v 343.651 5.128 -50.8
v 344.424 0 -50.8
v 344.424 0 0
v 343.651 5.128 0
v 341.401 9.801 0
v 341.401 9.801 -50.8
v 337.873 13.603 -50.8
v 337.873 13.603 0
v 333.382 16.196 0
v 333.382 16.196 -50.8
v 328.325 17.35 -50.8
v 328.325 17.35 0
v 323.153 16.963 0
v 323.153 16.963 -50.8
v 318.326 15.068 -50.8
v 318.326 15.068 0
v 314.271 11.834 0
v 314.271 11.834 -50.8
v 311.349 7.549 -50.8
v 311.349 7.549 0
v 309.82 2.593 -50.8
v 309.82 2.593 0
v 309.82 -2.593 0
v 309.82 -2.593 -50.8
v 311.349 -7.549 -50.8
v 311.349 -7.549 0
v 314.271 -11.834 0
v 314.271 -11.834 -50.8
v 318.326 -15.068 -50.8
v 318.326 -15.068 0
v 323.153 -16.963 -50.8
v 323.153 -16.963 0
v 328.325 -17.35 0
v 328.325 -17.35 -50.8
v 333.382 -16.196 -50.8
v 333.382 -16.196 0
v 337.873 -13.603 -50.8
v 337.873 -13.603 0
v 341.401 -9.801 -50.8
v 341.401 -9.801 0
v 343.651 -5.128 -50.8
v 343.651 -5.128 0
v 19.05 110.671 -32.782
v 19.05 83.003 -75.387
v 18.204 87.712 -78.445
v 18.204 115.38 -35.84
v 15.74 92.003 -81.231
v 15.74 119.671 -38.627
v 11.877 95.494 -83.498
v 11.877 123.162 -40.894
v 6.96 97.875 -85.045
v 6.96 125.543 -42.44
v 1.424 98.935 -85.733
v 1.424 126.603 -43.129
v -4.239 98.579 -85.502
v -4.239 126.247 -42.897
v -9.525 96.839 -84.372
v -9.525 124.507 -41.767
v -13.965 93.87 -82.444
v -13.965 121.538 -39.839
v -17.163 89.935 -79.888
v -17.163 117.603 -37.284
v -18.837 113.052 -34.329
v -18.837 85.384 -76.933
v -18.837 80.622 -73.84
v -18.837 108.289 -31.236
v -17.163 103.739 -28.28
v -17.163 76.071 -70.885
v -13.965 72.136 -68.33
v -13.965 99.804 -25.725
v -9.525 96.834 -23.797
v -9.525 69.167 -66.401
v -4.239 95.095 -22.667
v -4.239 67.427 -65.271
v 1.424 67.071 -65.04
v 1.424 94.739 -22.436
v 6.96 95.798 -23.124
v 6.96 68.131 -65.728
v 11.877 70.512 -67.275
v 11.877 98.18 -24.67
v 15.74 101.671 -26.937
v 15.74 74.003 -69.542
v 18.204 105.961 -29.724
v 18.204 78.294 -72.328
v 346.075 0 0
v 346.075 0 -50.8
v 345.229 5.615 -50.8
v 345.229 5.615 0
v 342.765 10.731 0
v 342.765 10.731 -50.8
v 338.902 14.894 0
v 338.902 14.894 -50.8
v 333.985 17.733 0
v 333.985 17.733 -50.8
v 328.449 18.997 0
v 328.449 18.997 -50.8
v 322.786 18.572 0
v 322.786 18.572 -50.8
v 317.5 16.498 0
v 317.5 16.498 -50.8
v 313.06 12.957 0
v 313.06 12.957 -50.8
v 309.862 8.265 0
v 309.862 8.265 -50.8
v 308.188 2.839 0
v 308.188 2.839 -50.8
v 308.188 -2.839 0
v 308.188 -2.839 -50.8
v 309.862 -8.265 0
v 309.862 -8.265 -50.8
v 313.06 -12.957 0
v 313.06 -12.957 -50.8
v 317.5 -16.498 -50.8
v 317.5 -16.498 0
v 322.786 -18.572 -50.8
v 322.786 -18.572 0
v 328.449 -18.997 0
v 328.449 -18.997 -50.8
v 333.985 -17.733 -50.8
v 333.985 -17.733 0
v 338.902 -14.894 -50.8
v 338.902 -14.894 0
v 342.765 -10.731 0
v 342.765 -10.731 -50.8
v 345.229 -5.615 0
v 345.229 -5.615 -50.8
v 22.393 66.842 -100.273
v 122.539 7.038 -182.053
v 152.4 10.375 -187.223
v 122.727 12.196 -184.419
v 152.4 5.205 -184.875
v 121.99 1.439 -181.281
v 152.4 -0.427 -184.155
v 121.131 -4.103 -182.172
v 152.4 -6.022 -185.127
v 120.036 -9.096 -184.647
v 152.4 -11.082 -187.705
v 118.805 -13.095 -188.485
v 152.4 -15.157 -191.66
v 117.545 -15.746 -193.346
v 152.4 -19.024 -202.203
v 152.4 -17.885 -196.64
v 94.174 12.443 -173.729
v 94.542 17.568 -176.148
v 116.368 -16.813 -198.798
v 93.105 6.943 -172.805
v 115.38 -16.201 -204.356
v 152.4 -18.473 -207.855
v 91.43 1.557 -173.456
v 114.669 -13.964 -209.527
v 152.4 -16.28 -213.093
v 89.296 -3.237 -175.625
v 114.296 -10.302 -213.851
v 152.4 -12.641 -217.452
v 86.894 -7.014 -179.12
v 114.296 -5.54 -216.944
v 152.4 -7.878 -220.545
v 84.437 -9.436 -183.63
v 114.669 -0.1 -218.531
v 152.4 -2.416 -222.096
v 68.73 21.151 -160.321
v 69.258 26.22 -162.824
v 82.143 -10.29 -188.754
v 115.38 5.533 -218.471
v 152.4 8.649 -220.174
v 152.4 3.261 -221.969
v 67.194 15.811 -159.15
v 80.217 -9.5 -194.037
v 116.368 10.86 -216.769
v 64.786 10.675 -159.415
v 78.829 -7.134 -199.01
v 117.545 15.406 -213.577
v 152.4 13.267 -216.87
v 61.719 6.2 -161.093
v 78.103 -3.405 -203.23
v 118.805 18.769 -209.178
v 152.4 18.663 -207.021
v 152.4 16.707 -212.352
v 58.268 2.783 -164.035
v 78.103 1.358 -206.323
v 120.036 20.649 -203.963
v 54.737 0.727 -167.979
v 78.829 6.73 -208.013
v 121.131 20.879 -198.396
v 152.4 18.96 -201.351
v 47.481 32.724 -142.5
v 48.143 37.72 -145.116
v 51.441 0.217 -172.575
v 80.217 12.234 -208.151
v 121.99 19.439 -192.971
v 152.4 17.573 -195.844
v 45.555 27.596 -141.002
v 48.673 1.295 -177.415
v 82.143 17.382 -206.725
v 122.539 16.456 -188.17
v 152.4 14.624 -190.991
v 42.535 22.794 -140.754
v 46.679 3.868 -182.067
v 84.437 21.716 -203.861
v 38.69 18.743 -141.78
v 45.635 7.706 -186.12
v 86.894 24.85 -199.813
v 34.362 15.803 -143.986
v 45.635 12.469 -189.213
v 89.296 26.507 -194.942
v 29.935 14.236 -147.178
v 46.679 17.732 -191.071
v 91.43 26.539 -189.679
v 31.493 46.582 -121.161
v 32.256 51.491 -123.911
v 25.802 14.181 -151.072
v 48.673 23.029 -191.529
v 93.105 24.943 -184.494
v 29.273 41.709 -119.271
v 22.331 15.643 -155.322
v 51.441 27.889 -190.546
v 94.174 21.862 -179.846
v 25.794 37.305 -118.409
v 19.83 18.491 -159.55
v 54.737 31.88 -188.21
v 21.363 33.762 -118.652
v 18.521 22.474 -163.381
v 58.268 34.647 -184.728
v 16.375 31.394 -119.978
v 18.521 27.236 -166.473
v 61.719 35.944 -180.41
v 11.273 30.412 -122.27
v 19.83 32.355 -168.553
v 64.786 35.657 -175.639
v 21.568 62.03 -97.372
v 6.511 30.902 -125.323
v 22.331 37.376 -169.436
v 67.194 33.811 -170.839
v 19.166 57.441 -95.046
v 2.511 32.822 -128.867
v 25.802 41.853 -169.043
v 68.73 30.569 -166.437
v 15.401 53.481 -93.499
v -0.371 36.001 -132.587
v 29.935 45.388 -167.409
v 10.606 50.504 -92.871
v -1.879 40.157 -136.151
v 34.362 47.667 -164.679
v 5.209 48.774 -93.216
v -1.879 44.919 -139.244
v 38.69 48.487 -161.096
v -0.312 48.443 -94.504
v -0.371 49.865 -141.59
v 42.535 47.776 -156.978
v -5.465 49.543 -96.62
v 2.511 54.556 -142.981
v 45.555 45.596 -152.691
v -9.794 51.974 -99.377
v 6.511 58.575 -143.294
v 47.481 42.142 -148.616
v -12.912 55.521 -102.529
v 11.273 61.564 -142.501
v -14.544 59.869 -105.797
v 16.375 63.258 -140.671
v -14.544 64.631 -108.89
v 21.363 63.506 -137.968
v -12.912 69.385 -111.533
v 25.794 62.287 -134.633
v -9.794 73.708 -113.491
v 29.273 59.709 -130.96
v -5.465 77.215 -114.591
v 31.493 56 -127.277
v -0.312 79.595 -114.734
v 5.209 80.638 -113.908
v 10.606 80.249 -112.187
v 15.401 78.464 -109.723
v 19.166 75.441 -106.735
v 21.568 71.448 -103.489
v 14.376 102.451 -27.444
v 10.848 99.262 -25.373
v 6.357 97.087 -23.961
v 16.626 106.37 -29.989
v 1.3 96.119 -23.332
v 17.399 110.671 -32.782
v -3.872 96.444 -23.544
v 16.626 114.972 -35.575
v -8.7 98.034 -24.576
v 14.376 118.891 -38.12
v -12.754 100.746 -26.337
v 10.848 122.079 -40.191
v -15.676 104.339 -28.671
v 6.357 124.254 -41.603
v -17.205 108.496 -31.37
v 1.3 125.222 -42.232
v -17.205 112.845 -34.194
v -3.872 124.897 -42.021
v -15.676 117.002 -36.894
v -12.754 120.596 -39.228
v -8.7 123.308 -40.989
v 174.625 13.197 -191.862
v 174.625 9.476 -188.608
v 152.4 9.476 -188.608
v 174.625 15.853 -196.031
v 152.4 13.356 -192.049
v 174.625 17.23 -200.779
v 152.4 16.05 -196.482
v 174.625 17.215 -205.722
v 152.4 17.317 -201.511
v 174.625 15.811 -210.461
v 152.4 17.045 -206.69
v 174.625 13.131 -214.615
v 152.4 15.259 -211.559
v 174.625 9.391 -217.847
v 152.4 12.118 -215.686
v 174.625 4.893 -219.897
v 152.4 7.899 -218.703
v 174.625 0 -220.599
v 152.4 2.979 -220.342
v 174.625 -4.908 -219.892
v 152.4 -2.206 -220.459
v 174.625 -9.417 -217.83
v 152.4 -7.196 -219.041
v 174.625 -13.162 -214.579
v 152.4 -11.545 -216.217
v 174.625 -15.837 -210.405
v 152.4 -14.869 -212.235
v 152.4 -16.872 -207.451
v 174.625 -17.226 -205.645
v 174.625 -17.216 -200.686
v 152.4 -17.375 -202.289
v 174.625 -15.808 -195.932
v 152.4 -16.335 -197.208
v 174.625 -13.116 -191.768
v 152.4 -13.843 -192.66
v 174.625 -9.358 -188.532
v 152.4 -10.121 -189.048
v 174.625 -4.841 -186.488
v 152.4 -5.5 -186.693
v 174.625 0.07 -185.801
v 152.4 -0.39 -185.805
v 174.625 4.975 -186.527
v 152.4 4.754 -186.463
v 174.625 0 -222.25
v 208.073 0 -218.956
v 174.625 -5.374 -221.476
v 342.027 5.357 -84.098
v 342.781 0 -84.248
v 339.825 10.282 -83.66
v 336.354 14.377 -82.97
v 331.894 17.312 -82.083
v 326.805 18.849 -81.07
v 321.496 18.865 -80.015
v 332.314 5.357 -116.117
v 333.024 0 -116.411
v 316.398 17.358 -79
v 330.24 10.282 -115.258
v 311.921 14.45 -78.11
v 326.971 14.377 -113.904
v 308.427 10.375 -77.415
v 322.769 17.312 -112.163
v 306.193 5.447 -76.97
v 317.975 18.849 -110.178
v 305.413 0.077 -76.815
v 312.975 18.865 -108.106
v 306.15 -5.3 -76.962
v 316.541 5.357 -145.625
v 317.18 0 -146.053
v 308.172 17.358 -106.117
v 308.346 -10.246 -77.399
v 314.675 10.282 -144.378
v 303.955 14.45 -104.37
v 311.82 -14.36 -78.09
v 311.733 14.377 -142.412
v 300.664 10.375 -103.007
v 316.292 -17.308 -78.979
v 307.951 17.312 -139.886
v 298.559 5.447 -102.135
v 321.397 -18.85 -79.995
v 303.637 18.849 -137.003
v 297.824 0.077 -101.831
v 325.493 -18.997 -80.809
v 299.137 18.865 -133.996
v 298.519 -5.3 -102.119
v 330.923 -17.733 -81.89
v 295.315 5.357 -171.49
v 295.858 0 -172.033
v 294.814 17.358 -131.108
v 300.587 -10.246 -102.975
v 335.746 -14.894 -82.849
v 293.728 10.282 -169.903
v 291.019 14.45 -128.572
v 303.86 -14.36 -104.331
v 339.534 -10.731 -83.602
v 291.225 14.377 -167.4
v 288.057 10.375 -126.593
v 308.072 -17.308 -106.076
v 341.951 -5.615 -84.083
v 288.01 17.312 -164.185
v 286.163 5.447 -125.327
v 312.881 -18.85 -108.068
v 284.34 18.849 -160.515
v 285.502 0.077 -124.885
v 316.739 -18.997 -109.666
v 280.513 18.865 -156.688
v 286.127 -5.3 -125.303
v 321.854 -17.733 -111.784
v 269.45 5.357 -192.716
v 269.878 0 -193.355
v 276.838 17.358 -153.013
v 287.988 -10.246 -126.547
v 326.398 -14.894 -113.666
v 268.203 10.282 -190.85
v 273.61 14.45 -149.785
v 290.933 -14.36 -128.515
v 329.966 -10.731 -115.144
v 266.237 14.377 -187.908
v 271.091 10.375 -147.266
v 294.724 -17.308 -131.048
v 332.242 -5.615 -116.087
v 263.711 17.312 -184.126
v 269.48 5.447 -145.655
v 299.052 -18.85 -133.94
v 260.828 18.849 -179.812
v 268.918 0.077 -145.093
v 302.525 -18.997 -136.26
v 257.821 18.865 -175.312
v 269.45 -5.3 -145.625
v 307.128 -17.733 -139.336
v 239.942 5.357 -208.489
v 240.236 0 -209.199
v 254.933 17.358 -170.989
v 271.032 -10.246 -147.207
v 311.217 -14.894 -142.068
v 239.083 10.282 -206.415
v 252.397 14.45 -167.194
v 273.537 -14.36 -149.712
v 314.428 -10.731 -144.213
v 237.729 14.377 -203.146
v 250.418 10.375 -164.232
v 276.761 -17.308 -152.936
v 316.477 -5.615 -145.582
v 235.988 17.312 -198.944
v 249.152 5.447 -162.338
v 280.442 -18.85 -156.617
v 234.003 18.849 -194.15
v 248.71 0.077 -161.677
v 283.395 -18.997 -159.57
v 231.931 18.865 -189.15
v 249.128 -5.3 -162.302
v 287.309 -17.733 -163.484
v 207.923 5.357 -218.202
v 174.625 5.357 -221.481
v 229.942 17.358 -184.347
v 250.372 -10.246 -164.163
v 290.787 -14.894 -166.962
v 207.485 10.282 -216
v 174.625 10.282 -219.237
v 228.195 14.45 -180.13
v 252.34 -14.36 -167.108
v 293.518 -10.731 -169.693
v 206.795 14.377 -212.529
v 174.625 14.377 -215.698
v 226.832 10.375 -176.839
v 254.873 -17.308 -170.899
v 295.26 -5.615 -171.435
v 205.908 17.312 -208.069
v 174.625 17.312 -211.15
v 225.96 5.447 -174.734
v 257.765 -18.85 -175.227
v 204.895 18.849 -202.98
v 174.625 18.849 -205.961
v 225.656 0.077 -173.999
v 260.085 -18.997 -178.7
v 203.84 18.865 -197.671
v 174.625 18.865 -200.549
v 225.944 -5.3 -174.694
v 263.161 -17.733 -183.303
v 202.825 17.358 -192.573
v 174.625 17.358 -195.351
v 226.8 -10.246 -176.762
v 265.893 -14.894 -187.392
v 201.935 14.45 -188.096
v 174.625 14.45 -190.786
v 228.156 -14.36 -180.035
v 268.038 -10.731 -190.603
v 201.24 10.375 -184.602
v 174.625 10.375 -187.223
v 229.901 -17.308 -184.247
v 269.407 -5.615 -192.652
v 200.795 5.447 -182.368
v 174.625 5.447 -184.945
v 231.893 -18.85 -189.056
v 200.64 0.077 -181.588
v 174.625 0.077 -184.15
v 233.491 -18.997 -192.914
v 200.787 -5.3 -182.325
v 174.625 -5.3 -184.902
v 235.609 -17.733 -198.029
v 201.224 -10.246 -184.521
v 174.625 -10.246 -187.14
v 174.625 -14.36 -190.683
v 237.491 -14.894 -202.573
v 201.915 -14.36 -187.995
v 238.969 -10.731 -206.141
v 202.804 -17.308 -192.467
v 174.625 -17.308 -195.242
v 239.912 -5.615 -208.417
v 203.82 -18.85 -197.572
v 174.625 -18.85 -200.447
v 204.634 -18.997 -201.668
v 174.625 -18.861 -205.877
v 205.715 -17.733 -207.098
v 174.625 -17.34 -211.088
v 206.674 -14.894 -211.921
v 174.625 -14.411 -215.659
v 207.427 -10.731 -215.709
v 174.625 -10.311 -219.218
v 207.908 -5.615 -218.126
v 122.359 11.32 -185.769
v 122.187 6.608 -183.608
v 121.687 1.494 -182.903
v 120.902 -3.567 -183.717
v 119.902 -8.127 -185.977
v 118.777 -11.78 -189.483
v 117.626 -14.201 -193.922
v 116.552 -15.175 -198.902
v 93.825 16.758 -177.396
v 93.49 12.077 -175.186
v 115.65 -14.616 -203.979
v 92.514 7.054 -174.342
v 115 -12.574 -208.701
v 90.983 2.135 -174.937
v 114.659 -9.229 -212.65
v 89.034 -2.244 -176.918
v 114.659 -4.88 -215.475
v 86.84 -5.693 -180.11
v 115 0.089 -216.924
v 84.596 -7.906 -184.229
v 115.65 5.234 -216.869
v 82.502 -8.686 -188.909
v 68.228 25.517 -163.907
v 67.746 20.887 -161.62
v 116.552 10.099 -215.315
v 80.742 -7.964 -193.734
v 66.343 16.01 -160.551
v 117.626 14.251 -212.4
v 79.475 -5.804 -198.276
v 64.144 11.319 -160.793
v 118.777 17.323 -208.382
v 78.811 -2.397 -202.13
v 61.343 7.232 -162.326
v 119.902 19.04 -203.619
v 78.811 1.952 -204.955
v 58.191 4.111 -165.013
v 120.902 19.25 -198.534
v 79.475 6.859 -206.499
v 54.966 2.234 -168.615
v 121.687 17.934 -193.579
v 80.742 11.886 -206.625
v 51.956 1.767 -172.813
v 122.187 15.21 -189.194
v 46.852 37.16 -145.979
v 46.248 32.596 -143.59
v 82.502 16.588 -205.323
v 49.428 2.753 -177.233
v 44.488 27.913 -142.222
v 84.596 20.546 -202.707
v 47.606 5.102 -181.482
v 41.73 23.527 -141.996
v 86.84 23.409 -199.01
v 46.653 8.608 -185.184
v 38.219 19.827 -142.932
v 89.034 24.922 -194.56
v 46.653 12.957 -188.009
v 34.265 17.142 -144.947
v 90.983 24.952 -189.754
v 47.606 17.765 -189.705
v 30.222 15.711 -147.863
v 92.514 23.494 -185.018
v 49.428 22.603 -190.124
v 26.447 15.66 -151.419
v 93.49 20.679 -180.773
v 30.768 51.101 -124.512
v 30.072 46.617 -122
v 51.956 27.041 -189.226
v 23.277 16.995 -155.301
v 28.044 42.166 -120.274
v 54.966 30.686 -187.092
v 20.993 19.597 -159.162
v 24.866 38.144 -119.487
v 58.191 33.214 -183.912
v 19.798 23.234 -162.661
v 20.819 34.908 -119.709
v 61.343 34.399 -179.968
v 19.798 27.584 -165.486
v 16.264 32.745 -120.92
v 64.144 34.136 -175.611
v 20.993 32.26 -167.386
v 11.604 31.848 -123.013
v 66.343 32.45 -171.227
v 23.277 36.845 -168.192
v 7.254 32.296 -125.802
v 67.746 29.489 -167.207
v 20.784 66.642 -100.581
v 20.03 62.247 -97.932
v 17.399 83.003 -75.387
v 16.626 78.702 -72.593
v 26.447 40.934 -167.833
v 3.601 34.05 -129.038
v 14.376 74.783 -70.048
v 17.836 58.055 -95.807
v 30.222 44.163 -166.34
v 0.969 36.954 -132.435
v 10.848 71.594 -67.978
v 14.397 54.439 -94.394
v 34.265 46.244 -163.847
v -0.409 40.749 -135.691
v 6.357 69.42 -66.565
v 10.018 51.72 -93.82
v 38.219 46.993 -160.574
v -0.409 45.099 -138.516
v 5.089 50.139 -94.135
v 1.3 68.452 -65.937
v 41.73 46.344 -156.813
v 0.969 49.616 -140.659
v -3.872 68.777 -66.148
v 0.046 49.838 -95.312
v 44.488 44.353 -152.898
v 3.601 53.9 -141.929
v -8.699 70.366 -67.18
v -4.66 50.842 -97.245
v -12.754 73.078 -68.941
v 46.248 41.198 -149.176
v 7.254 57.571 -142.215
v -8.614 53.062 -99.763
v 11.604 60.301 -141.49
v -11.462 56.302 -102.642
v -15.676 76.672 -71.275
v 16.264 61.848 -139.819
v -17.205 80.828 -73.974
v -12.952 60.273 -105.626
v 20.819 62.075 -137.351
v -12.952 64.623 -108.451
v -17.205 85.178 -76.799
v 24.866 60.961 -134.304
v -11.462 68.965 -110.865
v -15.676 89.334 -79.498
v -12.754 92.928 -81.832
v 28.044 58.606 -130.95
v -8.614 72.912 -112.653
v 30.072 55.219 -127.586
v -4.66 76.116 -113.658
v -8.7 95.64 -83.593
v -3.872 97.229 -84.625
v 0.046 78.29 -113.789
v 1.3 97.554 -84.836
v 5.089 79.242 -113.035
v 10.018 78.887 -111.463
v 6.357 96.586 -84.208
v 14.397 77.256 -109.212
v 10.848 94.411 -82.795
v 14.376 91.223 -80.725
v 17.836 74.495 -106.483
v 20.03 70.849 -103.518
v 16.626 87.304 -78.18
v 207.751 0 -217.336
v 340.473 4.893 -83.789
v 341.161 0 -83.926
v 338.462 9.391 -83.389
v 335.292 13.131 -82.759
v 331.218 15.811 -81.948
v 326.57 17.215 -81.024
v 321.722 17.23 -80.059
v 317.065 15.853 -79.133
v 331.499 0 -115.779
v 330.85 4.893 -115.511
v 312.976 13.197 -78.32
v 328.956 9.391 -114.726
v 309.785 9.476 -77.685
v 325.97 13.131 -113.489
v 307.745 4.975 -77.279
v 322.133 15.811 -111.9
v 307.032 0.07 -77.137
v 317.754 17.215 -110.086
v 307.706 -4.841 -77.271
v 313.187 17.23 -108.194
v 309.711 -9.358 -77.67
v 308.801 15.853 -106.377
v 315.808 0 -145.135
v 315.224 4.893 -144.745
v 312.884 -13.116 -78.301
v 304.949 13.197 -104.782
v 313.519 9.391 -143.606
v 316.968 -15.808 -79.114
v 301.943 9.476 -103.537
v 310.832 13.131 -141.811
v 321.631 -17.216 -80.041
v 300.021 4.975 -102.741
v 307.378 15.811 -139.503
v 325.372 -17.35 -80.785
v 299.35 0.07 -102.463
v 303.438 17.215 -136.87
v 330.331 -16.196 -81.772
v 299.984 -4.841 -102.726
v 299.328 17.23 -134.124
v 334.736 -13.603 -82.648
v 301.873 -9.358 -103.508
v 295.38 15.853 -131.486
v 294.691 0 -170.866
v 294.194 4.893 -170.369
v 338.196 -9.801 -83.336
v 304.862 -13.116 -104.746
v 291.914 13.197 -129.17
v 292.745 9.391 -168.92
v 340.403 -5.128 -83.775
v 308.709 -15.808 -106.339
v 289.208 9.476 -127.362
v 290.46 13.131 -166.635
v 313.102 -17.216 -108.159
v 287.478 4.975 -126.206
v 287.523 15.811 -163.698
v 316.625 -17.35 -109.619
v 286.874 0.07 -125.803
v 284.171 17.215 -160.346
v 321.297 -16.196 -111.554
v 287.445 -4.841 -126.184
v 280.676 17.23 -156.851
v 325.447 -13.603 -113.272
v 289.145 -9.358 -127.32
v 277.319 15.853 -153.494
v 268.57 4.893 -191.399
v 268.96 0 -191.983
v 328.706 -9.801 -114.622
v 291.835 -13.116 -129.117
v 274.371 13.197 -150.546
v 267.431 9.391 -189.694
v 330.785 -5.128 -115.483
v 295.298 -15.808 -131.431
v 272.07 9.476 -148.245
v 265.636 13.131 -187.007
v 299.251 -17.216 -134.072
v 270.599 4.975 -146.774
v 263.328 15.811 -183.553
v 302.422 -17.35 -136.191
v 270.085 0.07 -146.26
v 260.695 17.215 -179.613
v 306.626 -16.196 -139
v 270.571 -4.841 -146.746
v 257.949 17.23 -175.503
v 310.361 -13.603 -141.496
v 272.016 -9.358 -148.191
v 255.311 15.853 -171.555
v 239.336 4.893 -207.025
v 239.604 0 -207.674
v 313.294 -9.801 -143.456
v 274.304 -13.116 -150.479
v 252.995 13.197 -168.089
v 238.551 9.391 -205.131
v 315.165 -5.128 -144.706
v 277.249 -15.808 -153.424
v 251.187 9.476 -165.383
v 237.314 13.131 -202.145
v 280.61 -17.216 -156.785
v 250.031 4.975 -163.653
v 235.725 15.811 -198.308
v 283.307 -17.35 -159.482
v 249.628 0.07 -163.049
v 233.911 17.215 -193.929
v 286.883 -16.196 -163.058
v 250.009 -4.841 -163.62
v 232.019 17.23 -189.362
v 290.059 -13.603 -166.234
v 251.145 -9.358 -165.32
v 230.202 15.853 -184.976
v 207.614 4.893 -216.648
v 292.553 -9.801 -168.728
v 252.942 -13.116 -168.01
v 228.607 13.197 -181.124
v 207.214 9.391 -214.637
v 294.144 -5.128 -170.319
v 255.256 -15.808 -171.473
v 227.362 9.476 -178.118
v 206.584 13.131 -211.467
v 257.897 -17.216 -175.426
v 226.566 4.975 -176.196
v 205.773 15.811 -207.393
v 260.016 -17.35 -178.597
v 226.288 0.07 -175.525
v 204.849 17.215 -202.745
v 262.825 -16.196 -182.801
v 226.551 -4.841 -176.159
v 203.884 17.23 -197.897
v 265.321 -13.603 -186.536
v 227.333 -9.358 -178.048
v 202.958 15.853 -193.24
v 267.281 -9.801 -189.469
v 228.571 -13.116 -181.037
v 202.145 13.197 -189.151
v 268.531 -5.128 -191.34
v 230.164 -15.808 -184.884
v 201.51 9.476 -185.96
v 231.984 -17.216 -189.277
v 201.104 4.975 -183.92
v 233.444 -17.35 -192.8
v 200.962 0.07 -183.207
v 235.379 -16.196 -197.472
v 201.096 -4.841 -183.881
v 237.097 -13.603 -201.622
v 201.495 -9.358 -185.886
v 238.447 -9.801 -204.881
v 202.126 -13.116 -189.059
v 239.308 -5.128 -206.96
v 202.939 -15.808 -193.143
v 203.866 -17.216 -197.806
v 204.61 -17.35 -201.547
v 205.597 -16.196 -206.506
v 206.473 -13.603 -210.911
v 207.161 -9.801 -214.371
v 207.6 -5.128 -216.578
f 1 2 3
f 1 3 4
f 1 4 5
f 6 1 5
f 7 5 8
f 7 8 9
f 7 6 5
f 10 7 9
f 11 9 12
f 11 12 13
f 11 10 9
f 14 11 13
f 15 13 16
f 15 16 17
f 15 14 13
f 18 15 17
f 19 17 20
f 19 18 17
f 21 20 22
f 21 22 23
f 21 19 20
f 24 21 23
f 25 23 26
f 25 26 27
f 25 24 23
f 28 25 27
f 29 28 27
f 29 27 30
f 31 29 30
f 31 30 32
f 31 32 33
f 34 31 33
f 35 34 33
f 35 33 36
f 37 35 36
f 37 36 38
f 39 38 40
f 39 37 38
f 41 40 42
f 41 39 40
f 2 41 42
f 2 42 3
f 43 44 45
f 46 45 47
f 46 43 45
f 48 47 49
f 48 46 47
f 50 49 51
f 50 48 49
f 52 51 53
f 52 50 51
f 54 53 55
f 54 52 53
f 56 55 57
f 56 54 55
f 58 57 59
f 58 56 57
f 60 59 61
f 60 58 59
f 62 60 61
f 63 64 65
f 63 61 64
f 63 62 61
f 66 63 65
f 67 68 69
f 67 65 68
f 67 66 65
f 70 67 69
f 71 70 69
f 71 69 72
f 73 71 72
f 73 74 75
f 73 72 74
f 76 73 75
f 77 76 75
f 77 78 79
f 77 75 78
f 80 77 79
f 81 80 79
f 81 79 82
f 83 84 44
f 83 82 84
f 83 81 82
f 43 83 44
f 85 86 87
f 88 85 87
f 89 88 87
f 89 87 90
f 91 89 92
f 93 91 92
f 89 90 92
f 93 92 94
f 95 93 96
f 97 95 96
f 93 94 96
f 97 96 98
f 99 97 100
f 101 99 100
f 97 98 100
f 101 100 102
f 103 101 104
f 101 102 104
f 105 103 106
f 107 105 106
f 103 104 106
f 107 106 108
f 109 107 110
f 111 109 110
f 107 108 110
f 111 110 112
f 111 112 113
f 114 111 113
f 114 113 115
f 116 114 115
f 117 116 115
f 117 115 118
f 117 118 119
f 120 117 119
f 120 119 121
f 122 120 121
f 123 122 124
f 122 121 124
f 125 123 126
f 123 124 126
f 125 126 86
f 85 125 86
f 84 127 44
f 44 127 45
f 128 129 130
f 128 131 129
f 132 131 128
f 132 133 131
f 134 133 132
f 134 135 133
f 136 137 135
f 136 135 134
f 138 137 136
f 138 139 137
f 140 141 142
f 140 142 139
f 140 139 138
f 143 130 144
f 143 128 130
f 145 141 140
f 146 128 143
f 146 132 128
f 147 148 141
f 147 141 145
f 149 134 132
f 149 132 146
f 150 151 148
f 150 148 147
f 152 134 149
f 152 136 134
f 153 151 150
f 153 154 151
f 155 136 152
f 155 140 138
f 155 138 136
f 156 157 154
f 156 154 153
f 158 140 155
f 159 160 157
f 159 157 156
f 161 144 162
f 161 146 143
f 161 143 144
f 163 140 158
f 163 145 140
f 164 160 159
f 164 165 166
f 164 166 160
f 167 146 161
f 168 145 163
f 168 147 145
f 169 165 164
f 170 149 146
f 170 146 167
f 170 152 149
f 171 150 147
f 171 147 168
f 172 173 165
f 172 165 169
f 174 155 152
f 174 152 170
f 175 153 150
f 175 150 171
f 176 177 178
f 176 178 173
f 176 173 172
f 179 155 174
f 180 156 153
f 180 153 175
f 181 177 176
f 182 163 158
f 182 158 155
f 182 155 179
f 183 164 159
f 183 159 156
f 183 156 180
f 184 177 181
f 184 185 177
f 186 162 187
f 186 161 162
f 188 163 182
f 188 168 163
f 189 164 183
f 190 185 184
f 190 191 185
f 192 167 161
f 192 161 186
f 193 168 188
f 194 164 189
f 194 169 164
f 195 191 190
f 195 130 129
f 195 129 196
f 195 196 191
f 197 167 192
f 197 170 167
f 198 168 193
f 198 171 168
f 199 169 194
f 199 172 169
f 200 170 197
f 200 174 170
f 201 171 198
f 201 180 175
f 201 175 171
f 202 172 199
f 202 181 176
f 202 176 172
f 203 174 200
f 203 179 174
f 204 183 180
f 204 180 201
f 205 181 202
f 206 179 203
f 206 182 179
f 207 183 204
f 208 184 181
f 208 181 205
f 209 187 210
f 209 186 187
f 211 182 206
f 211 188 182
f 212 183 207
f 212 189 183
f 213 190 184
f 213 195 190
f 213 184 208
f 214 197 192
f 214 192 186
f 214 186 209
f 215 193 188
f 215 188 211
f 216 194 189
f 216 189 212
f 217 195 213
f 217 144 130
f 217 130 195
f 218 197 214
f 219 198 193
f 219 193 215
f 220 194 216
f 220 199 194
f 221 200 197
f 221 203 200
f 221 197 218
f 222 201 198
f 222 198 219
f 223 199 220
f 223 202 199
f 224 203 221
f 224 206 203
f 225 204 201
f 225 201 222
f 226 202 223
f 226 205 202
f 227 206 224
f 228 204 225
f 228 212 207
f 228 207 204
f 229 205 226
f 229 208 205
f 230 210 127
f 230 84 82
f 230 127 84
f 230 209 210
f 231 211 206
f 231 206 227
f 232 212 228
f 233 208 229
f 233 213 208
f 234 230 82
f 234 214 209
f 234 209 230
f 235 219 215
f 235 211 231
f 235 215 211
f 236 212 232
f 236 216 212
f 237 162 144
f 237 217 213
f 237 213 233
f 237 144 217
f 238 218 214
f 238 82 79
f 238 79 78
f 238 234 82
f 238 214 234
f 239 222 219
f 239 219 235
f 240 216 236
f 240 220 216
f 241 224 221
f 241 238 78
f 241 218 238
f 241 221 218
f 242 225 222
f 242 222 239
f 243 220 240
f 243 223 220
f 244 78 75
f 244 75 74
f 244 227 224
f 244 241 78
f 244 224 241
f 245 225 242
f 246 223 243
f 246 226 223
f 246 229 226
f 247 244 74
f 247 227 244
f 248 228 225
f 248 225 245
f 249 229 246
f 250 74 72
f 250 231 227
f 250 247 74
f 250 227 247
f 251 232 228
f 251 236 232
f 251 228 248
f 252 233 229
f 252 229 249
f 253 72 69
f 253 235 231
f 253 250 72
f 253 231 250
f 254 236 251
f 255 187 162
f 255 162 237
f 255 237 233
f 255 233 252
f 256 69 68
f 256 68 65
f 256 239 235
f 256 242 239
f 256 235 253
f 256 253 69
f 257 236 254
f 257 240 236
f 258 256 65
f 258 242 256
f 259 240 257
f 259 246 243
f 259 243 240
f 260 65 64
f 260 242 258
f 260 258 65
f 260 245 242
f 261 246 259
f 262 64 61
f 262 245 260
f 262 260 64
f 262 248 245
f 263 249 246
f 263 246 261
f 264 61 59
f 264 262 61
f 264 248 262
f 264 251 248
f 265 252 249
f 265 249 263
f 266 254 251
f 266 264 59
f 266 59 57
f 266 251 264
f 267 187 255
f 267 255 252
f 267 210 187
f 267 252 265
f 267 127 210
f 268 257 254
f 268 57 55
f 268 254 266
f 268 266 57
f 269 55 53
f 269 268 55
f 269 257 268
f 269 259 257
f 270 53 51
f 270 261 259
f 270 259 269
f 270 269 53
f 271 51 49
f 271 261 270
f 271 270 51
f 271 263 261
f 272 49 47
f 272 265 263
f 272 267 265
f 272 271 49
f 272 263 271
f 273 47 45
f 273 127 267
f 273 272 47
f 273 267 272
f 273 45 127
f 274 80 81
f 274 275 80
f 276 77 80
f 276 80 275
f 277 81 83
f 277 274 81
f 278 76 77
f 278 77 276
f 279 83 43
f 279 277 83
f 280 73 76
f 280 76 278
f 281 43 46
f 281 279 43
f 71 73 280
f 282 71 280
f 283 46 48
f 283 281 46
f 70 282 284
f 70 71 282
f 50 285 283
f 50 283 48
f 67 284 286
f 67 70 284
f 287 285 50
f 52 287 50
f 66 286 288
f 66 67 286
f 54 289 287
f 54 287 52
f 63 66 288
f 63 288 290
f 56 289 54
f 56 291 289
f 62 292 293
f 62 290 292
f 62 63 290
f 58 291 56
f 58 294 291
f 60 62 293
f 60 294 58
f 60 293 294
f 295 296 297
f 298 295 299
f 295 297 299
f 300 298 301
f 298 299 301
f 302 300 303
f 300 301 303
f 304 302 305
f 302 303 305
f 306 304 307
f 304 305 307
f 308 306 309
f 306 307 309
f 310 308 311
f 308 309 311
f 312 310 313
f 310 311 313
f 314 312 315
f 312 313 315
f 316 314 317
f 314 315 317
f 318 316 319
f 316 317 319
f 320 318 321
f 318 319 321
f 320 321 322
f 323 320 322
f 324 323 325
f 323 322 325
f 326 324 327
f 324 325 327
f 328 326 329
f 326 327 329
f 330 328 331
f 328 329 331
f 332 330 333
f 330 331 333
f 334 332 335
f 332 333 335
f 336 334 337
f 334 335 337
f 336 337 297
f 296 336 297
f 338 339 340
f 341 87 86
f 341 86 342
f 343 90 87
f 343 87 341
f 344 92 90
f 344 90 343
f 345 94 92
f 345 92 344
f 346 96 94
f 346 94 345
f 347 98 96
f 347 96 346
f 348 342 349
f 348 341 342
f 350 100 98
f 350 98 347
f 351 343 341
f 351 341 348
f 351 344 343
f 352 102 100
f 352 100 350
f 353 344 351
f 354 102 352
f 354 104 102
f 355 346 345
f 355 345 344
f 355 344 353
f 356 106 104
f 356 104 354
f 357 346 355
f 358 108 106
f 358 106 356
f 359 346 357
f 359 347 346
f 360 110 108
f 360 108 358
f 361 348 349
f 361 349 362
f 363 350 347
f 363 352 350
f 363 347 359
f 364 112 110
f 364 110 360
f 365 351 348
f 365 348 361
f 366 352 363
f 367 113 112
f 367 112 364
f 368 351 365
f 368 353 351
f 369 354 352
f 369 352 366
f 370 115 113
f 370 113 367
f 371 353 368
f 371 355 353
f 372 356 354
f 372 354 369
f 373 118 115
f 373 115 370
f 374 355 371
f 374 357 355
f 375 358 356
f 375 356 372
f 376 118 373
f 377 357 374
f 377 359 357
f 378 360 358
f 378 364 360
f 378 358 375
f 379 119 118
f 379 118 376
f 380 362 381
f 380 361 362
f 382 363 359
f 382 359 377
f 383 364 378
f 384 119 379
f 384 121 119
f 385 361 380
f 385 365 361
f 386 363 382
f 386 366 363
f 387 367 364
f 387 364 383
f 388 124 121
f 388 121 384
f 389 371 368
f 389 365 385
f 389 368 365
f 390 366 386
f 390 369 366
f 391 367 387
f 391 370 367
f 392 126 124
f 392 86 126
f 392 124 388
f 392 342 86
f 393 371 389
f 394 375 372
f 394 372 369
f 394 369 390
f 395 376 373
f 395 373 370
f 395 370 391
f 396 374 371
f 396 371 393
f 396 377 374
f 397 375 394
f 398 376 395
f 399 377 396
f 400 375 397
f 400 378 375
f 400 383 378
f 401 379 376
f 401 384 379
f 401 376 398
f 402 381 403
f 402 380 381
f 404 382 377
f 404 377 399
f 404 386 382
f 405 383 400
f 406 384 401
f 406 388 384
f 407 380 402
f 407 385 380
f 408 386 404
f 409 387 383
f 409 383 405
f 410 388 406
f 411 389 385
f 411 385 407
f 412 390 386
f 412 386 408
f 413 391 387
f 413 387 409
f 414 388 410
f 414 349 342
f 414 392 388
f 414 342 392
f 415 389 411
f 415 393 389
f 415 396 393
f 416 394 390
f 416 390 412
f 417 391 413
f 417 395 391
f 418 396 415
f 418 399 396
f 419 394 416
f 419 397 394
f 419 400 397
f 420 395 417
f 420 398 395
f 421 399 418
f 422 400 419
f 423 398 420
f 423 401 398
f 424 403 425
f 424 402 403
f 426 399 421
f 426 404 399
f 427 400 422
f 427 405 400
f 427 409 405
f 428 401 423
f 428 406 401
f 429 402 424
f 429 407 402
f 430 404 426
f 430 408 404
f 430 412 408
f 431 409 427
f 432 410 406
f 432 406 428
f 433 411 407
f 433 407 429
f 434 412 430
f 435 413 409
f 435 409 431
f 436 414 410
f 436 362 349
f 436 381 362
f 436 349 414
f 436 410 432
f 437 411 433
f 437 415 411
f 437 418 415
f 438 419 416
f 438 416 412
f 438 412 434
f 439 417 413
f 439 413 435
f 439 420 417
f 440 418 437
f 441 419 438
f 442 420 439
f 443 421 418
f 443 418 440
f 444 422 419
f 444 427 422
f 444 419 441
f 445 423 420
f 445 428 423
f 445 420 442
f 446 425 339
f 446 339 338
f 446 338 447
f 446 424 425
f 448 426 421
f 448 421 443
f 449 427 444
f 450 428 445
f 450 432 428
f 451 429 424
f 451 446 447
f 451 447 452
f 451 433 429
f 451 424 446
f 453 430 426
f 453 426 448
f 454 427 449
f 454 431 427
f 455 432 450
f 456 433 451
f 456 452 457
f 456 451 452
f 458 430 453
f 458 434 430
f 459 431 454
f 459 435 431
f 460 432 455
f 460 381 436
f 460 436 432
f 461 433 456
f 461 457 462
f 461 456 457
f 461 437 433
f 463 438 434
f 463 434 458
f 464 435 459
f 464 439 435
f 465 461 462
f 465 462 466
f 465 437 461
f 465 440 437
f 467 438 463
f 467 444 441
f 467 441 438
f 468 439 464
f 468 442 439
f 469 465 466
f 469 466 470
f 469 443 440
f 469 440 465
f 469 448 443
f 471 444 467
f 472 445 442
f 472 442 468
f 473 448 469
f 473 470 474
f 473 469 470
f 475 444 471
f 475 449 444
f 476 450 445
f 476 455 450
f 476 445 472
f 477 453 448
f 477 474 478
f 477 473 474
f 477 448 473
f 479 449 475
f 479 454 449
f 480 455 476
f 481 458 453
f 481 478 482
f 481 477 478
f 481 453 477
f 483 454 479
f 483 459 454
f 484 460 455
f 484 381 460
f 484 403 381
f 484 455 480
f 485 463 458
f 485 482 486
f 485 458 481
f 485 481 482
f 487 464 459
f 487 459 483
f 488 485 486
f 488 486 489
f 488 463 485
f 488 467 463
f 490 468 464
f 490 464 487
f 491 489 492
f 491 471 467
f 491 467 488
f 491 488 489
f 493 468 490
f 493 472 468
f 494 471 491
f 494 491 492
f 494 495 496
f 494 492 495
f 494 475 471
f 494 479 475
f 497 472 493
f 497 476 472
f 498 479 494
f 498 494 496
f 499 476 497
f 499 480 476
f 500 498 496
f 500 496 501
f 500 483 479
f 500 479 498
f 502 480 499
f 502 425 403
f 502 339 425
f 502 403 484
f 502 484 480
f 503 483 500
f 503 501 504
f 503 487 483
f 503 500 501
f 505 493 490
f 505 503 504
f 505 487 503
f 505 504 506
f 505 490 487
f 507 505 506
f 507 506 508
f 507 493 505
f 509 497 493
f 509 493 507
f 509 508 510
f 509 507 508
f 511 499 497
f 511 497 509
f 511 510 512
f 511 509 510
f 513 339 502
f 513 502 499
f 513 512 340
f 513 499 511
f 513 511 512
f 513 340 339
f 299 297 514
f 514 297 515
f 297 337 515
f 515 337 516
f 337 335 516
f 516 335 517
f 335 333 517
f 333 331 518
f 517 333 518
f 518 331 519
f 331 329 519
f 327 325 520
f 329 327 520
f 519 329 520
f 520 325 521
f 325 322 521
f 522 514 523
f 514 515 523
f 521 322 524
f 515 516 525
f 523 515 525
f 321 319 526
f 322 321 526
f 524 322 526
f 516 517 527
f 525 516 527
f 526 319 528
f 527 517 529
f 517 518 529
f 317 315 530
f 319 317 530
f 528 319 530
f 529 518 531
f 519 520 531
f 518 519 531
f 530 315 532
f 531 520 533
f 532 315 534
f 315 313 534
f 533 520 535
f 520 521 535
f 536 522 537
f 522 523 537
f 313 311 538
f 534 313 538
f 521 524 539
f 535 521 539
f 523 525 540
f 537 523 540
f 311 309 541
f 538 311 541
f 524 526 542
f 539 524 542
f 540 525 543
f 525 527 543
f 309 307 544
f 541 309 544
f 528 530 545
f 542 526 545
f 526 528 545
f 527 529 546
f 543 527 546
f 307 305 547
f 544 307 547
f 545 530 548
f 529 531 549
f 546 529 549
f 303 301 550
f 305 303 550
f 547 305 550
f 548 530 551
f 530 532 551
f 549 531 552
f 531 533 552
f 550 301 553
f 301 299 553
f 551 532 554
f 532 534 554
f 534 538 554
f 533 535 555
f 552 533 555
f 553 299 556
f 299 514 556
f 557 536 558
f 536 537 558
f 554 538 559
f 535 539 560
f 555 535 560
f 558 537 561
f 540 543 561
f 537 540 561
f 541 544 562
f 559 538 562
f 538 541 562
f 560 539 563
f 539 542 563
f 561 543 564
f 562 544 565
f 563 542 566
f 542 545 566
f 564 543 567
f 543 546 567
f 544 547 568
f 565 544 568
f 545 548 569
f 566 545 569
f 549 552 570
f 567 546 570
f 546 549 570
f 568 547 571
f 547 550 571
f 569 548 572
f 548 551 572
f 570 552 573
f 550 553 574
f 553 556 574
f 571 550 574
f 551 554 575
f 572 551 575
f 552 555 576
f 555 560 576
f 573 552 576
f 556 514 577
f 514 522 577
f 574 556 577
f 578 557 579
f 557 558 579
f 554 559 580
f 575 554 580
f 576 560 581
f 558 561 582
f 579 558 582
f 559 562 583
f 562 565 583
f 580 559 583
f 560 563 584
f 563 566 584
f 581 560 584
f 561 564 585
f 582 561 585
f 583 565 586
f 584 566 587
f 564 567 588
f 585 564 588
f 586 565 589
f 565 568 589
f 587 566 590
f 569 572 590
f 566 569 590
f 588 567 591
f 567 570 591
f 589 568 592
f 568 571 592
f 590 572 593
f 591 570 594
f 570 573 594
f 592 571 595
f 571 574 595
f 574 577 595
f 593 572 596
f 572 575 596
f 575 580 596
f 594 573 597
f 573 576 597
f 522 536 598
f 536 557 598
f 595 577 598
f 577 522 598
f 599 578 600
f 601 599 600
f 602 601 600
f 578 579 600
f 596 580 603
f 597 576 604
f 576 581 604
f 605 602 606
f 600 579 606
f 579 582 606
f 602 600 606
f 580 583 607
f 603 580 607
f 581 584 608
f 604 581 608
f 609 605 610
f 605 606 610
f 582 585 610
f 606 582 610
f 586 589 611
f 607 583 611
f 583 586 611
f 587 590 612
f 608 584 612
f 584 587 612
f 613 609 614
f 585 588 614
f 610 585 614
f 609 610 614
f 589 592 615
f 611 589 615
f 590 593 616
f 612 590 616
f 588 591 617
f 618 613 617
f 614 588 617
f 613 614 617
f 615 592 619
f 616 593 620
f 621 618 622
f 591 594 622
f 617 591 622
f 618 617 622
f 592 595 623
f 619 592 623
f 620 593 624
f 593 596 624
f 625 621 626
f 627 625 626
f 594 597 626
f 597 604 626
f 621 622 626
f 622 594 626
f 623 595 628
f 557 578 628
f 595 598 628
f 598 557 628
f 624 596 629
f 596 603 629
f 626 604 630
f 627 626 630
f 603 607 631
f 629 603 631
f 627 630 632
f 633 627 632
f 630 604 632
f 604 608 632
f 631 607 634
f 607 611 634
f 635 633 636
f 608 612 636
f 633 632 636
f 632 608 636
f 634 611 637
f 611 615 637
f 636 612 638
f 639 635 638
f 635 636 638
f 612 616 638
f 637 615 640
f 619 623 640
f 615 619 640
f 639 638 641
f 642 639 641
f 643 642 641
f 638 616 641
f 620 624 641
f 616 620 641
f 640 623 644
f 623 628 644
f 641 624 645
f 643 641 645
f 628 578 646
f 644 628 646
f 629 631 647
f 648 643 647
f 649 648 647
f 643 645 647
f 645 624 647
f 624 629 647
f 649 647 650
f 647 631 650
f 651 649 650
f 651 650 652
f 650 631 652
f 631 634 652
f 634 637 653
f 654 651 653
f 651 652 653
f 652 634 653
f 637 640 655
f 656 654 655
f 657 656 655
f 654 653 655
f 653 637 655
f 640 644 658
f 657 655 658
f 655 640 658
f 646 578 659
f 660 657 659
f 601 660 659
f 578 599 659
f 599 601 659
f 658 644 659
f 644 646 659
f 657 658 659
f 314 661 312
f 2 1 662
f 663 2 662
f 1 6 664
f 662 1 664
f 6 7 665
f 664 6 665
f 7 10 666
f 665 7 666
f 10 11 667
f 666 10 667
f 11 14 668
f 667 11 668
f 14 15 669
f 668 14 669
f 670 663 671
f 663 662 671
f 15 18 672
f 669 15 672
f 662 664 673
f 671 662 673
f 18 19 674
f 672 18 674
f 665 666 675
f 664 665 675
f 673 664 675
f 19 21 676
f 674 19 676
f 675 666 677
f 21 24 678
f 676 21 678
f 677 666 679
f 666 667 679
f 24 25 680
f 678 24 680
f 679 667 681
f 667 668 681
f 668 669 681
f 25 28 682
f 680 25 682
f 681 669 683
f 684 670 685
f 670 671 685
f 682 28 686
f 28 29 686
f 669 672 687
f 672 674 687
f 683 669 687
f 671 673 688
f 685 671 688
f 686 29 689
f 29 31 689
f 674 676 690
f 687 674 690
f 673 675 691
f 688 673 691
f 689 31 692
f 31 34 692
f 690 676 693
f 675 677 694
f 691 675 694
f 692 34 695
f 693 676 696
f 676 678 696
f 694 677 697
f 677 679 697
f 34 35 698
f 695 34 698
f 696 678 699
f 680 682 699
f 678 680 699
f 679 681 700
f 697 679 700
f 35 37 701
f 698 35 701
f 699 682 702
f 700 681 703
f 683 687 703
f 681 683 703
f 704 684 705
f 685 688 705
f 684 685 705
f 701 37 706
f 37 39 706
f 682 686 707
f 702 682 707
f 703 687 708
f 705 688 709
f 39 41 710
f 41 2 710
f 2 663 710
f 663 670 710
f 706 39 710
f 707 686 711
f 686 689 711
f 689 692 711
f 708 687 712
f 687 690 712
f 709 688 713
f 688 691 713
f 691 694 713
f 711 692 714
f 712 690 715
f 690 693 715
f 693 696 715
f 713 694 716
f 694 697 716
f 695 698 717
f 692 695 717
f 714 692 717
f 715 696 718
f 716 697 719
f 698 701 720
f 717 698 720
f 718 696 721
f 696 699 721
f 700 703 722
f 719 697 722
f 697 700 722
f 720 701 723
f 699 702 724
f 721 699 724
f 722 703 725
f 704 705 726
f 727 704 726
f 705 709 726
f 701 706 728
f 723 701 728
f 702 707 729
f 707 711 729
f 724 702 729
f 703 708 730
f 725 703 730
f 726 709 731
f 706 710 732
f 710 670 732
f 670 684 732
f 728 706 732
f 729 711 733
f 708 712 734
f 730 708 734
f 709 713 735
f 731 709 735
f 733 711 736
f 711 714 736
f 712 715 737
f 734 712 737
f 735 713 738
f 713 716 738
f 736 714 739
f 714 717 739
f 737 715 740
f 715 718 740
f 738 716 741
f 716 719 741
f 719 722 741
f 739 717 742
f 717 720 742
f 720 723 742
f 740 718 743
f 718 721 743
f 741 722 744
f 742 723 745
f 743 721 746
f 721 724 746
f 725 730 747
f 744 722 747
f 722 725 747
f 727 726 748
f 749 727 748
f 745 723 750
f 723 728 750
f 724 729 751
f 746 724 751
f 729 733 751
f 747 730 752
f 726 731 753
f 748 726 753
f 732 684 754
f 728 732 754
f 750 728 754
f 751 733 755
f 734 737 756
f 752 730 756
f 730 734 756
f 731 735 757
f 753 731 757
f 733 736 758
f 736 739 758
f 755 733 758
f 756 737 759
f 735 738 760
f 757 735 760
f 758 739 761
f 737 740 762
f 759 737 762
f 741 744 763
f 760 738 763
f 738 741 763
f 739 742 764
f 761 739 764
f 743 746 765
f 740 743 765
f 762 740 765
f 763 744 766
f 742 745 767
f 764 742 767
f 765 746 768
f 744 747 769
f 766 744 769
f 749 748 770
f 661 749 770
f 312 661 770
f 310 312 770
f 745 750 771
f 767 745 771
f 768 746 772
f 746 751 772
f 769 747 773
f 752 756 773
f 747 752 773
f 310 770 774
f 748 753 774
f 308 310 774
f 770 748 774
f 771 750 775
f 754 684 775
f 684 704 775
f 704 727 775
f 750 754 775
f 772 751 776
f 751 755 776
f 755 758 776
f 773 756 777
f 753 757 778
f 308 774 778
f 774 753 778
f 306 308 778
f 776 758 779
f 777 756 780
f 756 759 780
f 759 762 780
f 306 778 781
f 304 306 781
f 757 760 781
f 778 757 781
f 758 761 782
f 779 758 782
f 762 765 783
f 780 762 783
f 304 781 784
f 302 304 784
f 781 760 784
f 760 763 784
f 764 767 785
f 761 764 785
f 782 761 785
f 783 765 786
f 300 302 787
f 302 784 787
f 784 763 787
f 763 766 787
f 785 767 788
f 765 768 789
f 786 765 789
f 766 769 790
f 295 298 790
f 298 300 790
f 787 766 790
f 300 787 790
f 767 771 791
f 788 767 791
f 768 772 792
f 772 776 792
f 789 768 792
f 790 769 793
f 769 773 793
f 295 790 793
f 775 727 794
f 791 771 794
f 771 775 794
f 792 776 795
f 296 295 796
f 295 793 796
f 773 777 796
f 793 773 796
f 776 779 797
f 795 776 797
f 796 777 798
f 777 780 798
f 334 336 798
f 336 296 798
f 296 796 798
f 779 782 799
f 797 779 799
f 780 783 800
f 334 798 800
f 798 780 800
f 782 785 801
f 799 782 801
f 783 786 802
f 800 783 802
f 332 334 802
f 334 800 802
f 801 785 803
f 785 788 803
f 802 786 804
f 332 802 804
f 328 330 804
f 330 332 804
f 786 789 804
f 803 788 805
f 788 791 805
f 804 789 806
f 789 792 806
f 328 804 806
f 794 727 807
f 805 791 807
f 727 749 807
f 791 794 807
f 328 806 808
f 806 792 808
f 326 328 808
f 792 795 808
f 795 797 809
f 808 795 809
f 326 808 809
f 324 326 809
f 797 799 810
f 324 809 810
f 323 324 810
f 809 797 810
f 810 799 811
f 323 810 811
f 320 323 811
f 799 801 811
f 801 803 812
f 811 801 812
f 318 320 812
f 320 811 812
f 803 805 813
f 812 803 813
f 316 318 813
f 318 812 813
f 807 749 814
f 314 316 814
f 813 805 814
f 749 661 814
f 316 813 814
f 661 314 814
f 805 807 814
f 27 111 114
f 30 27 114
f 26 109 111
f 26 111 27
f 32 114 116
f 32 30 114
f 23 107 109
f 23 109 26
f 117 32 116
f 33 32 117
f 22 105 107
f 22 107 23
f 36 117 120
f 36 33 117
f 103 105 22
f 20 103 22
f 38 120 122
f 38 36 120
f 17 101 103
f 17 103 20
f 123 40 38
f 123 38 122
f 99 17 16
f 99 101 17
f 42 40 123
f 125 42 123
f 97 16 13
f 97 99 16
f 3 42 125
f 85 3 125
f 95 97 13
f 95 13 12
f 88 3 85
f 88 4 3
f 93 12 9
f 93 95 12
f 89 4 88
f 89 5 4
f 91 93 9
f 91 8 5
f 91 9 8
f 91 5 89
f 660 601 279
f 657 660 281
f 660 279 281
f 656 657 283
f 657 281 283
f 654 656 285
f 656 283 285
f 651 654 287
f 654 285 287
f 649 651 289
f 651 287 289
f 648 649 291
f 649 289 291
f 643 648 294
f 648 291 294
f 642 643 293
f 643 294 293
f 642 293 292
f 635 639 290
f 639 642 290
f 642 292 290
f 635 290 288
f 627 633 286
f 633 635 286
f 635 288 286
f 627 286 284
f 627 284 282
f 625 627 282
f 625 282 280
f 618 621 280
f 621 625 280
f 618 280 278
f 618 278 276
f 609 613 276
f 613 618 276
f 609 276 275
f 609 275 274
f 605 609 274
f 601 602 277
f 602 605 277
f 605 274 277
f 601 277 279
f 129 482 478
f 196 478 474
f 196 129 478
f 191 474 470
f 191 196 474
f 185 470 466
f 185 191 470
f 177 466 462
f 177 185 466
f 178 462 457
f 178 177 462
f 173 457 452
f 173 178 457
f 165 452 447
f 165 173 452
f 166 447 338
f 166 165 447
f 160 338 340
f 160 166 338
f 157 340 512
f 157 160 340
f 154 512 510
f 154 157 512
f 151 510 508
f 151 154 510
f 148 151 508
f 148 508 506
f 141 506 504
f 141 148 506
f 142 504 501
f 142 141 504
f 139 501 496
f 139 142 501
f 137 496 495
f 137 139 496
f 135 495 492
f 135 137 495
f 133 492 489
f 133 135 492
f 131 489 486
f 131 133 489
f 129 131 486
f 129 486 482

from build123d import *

# Parameters (mm, degrees)
SKETCH5_R            = 19.05
SKETCH5_R_2          = 17.399
SWEEP2_START         = -50.8000001
SWEEP2_OUTLINE_R     = 19.05
SWEEP2_OUTLINE_R_2   = 17.399
SWEEP2_DEPTH         = 50.8000001
SWEEP2_2_OUTLINE_R   = 19.05
SWEEP2_2_OUTLINE_R_2 = 17.399
SWEEP2_2_ANGLE       = 90


with BuildPart() as part:
    # Sweep1: sweep along a path in Sketch4
    with BuildLine(Plane(origin=(0, 92.816218496, -60.275557063), x_dir=(1, 0, 0), z_dir=(0, 0.8386705679454234, -0.5446390350150281))) as sweep1_path:
        Line((174.625, 170.417859407), (152.4, 170.417859407))
        ThreePointArc((152.4, 170.417859407), (44.636926547, 125.780932859), (0, 18.017859407))
        Line((0, 18.017859407), (0, -32.782140593))
    # Sketch5 → Sweep1 (sweep)
    with BuildSketch(Plane(origin=(327.025, 110.670651915, -32.782140593), x_dir=(1, 0, 0), z_dir=(0, 0.5446390350150281, 0.8386705679454234))):
        with Locations((-327.025, 0)):
            Circle(SKETCH5_R)
        with Locations((-327.025, 0)):
            Circle(SKETCH5_R_2, mode=Mode.SUBTRACT)
    sweep(path=sweep1_path.line)



with BuildPart() as body_2:
    # Sweep2: read off the stored shape, not the designer's step
    # Sweep2 outline → Sweep2 (new body)
    with BuildSketch(Plane.XY.offset(SWEEP2_START)):
        with Locations((327.025, 0)):
            Circle(SWEEP2_OUTLINE_R)
        with Locations((327.025, 0)):
            Circle(SWEEP2_OUTLINE_R_2, mode=Mode.SUBTRACT)
    extrude(amount=SWEEP2_DEPTH)


with BuildPart() as part_1:
    add(part.part)

    add(body_2.part)  # Sweep2 2 merges body 2
    # Sweep2 2 outline → Sweep2 2 (revolve)
    with BuildSketch(Plane(origin=(174.625, 0, -50.8), x_dir=(1, 0, 0), z_dir=(0, 0, 1))):
        with Locations((152.4, 0)):
            Circle(SWEEP2_2_OUTLINE_R)
        with Locations((152.4, 0)):
            Circle(SWEEP2_2_OUTLINE_R_2, mode=Mode.SUBTRACT)
    revolve(axis=Axis((174.625, 0, -50.8), (0, 1, 0)), revolution_arc=SWEEP2_2_ANGLE)


solid = part_1.part
